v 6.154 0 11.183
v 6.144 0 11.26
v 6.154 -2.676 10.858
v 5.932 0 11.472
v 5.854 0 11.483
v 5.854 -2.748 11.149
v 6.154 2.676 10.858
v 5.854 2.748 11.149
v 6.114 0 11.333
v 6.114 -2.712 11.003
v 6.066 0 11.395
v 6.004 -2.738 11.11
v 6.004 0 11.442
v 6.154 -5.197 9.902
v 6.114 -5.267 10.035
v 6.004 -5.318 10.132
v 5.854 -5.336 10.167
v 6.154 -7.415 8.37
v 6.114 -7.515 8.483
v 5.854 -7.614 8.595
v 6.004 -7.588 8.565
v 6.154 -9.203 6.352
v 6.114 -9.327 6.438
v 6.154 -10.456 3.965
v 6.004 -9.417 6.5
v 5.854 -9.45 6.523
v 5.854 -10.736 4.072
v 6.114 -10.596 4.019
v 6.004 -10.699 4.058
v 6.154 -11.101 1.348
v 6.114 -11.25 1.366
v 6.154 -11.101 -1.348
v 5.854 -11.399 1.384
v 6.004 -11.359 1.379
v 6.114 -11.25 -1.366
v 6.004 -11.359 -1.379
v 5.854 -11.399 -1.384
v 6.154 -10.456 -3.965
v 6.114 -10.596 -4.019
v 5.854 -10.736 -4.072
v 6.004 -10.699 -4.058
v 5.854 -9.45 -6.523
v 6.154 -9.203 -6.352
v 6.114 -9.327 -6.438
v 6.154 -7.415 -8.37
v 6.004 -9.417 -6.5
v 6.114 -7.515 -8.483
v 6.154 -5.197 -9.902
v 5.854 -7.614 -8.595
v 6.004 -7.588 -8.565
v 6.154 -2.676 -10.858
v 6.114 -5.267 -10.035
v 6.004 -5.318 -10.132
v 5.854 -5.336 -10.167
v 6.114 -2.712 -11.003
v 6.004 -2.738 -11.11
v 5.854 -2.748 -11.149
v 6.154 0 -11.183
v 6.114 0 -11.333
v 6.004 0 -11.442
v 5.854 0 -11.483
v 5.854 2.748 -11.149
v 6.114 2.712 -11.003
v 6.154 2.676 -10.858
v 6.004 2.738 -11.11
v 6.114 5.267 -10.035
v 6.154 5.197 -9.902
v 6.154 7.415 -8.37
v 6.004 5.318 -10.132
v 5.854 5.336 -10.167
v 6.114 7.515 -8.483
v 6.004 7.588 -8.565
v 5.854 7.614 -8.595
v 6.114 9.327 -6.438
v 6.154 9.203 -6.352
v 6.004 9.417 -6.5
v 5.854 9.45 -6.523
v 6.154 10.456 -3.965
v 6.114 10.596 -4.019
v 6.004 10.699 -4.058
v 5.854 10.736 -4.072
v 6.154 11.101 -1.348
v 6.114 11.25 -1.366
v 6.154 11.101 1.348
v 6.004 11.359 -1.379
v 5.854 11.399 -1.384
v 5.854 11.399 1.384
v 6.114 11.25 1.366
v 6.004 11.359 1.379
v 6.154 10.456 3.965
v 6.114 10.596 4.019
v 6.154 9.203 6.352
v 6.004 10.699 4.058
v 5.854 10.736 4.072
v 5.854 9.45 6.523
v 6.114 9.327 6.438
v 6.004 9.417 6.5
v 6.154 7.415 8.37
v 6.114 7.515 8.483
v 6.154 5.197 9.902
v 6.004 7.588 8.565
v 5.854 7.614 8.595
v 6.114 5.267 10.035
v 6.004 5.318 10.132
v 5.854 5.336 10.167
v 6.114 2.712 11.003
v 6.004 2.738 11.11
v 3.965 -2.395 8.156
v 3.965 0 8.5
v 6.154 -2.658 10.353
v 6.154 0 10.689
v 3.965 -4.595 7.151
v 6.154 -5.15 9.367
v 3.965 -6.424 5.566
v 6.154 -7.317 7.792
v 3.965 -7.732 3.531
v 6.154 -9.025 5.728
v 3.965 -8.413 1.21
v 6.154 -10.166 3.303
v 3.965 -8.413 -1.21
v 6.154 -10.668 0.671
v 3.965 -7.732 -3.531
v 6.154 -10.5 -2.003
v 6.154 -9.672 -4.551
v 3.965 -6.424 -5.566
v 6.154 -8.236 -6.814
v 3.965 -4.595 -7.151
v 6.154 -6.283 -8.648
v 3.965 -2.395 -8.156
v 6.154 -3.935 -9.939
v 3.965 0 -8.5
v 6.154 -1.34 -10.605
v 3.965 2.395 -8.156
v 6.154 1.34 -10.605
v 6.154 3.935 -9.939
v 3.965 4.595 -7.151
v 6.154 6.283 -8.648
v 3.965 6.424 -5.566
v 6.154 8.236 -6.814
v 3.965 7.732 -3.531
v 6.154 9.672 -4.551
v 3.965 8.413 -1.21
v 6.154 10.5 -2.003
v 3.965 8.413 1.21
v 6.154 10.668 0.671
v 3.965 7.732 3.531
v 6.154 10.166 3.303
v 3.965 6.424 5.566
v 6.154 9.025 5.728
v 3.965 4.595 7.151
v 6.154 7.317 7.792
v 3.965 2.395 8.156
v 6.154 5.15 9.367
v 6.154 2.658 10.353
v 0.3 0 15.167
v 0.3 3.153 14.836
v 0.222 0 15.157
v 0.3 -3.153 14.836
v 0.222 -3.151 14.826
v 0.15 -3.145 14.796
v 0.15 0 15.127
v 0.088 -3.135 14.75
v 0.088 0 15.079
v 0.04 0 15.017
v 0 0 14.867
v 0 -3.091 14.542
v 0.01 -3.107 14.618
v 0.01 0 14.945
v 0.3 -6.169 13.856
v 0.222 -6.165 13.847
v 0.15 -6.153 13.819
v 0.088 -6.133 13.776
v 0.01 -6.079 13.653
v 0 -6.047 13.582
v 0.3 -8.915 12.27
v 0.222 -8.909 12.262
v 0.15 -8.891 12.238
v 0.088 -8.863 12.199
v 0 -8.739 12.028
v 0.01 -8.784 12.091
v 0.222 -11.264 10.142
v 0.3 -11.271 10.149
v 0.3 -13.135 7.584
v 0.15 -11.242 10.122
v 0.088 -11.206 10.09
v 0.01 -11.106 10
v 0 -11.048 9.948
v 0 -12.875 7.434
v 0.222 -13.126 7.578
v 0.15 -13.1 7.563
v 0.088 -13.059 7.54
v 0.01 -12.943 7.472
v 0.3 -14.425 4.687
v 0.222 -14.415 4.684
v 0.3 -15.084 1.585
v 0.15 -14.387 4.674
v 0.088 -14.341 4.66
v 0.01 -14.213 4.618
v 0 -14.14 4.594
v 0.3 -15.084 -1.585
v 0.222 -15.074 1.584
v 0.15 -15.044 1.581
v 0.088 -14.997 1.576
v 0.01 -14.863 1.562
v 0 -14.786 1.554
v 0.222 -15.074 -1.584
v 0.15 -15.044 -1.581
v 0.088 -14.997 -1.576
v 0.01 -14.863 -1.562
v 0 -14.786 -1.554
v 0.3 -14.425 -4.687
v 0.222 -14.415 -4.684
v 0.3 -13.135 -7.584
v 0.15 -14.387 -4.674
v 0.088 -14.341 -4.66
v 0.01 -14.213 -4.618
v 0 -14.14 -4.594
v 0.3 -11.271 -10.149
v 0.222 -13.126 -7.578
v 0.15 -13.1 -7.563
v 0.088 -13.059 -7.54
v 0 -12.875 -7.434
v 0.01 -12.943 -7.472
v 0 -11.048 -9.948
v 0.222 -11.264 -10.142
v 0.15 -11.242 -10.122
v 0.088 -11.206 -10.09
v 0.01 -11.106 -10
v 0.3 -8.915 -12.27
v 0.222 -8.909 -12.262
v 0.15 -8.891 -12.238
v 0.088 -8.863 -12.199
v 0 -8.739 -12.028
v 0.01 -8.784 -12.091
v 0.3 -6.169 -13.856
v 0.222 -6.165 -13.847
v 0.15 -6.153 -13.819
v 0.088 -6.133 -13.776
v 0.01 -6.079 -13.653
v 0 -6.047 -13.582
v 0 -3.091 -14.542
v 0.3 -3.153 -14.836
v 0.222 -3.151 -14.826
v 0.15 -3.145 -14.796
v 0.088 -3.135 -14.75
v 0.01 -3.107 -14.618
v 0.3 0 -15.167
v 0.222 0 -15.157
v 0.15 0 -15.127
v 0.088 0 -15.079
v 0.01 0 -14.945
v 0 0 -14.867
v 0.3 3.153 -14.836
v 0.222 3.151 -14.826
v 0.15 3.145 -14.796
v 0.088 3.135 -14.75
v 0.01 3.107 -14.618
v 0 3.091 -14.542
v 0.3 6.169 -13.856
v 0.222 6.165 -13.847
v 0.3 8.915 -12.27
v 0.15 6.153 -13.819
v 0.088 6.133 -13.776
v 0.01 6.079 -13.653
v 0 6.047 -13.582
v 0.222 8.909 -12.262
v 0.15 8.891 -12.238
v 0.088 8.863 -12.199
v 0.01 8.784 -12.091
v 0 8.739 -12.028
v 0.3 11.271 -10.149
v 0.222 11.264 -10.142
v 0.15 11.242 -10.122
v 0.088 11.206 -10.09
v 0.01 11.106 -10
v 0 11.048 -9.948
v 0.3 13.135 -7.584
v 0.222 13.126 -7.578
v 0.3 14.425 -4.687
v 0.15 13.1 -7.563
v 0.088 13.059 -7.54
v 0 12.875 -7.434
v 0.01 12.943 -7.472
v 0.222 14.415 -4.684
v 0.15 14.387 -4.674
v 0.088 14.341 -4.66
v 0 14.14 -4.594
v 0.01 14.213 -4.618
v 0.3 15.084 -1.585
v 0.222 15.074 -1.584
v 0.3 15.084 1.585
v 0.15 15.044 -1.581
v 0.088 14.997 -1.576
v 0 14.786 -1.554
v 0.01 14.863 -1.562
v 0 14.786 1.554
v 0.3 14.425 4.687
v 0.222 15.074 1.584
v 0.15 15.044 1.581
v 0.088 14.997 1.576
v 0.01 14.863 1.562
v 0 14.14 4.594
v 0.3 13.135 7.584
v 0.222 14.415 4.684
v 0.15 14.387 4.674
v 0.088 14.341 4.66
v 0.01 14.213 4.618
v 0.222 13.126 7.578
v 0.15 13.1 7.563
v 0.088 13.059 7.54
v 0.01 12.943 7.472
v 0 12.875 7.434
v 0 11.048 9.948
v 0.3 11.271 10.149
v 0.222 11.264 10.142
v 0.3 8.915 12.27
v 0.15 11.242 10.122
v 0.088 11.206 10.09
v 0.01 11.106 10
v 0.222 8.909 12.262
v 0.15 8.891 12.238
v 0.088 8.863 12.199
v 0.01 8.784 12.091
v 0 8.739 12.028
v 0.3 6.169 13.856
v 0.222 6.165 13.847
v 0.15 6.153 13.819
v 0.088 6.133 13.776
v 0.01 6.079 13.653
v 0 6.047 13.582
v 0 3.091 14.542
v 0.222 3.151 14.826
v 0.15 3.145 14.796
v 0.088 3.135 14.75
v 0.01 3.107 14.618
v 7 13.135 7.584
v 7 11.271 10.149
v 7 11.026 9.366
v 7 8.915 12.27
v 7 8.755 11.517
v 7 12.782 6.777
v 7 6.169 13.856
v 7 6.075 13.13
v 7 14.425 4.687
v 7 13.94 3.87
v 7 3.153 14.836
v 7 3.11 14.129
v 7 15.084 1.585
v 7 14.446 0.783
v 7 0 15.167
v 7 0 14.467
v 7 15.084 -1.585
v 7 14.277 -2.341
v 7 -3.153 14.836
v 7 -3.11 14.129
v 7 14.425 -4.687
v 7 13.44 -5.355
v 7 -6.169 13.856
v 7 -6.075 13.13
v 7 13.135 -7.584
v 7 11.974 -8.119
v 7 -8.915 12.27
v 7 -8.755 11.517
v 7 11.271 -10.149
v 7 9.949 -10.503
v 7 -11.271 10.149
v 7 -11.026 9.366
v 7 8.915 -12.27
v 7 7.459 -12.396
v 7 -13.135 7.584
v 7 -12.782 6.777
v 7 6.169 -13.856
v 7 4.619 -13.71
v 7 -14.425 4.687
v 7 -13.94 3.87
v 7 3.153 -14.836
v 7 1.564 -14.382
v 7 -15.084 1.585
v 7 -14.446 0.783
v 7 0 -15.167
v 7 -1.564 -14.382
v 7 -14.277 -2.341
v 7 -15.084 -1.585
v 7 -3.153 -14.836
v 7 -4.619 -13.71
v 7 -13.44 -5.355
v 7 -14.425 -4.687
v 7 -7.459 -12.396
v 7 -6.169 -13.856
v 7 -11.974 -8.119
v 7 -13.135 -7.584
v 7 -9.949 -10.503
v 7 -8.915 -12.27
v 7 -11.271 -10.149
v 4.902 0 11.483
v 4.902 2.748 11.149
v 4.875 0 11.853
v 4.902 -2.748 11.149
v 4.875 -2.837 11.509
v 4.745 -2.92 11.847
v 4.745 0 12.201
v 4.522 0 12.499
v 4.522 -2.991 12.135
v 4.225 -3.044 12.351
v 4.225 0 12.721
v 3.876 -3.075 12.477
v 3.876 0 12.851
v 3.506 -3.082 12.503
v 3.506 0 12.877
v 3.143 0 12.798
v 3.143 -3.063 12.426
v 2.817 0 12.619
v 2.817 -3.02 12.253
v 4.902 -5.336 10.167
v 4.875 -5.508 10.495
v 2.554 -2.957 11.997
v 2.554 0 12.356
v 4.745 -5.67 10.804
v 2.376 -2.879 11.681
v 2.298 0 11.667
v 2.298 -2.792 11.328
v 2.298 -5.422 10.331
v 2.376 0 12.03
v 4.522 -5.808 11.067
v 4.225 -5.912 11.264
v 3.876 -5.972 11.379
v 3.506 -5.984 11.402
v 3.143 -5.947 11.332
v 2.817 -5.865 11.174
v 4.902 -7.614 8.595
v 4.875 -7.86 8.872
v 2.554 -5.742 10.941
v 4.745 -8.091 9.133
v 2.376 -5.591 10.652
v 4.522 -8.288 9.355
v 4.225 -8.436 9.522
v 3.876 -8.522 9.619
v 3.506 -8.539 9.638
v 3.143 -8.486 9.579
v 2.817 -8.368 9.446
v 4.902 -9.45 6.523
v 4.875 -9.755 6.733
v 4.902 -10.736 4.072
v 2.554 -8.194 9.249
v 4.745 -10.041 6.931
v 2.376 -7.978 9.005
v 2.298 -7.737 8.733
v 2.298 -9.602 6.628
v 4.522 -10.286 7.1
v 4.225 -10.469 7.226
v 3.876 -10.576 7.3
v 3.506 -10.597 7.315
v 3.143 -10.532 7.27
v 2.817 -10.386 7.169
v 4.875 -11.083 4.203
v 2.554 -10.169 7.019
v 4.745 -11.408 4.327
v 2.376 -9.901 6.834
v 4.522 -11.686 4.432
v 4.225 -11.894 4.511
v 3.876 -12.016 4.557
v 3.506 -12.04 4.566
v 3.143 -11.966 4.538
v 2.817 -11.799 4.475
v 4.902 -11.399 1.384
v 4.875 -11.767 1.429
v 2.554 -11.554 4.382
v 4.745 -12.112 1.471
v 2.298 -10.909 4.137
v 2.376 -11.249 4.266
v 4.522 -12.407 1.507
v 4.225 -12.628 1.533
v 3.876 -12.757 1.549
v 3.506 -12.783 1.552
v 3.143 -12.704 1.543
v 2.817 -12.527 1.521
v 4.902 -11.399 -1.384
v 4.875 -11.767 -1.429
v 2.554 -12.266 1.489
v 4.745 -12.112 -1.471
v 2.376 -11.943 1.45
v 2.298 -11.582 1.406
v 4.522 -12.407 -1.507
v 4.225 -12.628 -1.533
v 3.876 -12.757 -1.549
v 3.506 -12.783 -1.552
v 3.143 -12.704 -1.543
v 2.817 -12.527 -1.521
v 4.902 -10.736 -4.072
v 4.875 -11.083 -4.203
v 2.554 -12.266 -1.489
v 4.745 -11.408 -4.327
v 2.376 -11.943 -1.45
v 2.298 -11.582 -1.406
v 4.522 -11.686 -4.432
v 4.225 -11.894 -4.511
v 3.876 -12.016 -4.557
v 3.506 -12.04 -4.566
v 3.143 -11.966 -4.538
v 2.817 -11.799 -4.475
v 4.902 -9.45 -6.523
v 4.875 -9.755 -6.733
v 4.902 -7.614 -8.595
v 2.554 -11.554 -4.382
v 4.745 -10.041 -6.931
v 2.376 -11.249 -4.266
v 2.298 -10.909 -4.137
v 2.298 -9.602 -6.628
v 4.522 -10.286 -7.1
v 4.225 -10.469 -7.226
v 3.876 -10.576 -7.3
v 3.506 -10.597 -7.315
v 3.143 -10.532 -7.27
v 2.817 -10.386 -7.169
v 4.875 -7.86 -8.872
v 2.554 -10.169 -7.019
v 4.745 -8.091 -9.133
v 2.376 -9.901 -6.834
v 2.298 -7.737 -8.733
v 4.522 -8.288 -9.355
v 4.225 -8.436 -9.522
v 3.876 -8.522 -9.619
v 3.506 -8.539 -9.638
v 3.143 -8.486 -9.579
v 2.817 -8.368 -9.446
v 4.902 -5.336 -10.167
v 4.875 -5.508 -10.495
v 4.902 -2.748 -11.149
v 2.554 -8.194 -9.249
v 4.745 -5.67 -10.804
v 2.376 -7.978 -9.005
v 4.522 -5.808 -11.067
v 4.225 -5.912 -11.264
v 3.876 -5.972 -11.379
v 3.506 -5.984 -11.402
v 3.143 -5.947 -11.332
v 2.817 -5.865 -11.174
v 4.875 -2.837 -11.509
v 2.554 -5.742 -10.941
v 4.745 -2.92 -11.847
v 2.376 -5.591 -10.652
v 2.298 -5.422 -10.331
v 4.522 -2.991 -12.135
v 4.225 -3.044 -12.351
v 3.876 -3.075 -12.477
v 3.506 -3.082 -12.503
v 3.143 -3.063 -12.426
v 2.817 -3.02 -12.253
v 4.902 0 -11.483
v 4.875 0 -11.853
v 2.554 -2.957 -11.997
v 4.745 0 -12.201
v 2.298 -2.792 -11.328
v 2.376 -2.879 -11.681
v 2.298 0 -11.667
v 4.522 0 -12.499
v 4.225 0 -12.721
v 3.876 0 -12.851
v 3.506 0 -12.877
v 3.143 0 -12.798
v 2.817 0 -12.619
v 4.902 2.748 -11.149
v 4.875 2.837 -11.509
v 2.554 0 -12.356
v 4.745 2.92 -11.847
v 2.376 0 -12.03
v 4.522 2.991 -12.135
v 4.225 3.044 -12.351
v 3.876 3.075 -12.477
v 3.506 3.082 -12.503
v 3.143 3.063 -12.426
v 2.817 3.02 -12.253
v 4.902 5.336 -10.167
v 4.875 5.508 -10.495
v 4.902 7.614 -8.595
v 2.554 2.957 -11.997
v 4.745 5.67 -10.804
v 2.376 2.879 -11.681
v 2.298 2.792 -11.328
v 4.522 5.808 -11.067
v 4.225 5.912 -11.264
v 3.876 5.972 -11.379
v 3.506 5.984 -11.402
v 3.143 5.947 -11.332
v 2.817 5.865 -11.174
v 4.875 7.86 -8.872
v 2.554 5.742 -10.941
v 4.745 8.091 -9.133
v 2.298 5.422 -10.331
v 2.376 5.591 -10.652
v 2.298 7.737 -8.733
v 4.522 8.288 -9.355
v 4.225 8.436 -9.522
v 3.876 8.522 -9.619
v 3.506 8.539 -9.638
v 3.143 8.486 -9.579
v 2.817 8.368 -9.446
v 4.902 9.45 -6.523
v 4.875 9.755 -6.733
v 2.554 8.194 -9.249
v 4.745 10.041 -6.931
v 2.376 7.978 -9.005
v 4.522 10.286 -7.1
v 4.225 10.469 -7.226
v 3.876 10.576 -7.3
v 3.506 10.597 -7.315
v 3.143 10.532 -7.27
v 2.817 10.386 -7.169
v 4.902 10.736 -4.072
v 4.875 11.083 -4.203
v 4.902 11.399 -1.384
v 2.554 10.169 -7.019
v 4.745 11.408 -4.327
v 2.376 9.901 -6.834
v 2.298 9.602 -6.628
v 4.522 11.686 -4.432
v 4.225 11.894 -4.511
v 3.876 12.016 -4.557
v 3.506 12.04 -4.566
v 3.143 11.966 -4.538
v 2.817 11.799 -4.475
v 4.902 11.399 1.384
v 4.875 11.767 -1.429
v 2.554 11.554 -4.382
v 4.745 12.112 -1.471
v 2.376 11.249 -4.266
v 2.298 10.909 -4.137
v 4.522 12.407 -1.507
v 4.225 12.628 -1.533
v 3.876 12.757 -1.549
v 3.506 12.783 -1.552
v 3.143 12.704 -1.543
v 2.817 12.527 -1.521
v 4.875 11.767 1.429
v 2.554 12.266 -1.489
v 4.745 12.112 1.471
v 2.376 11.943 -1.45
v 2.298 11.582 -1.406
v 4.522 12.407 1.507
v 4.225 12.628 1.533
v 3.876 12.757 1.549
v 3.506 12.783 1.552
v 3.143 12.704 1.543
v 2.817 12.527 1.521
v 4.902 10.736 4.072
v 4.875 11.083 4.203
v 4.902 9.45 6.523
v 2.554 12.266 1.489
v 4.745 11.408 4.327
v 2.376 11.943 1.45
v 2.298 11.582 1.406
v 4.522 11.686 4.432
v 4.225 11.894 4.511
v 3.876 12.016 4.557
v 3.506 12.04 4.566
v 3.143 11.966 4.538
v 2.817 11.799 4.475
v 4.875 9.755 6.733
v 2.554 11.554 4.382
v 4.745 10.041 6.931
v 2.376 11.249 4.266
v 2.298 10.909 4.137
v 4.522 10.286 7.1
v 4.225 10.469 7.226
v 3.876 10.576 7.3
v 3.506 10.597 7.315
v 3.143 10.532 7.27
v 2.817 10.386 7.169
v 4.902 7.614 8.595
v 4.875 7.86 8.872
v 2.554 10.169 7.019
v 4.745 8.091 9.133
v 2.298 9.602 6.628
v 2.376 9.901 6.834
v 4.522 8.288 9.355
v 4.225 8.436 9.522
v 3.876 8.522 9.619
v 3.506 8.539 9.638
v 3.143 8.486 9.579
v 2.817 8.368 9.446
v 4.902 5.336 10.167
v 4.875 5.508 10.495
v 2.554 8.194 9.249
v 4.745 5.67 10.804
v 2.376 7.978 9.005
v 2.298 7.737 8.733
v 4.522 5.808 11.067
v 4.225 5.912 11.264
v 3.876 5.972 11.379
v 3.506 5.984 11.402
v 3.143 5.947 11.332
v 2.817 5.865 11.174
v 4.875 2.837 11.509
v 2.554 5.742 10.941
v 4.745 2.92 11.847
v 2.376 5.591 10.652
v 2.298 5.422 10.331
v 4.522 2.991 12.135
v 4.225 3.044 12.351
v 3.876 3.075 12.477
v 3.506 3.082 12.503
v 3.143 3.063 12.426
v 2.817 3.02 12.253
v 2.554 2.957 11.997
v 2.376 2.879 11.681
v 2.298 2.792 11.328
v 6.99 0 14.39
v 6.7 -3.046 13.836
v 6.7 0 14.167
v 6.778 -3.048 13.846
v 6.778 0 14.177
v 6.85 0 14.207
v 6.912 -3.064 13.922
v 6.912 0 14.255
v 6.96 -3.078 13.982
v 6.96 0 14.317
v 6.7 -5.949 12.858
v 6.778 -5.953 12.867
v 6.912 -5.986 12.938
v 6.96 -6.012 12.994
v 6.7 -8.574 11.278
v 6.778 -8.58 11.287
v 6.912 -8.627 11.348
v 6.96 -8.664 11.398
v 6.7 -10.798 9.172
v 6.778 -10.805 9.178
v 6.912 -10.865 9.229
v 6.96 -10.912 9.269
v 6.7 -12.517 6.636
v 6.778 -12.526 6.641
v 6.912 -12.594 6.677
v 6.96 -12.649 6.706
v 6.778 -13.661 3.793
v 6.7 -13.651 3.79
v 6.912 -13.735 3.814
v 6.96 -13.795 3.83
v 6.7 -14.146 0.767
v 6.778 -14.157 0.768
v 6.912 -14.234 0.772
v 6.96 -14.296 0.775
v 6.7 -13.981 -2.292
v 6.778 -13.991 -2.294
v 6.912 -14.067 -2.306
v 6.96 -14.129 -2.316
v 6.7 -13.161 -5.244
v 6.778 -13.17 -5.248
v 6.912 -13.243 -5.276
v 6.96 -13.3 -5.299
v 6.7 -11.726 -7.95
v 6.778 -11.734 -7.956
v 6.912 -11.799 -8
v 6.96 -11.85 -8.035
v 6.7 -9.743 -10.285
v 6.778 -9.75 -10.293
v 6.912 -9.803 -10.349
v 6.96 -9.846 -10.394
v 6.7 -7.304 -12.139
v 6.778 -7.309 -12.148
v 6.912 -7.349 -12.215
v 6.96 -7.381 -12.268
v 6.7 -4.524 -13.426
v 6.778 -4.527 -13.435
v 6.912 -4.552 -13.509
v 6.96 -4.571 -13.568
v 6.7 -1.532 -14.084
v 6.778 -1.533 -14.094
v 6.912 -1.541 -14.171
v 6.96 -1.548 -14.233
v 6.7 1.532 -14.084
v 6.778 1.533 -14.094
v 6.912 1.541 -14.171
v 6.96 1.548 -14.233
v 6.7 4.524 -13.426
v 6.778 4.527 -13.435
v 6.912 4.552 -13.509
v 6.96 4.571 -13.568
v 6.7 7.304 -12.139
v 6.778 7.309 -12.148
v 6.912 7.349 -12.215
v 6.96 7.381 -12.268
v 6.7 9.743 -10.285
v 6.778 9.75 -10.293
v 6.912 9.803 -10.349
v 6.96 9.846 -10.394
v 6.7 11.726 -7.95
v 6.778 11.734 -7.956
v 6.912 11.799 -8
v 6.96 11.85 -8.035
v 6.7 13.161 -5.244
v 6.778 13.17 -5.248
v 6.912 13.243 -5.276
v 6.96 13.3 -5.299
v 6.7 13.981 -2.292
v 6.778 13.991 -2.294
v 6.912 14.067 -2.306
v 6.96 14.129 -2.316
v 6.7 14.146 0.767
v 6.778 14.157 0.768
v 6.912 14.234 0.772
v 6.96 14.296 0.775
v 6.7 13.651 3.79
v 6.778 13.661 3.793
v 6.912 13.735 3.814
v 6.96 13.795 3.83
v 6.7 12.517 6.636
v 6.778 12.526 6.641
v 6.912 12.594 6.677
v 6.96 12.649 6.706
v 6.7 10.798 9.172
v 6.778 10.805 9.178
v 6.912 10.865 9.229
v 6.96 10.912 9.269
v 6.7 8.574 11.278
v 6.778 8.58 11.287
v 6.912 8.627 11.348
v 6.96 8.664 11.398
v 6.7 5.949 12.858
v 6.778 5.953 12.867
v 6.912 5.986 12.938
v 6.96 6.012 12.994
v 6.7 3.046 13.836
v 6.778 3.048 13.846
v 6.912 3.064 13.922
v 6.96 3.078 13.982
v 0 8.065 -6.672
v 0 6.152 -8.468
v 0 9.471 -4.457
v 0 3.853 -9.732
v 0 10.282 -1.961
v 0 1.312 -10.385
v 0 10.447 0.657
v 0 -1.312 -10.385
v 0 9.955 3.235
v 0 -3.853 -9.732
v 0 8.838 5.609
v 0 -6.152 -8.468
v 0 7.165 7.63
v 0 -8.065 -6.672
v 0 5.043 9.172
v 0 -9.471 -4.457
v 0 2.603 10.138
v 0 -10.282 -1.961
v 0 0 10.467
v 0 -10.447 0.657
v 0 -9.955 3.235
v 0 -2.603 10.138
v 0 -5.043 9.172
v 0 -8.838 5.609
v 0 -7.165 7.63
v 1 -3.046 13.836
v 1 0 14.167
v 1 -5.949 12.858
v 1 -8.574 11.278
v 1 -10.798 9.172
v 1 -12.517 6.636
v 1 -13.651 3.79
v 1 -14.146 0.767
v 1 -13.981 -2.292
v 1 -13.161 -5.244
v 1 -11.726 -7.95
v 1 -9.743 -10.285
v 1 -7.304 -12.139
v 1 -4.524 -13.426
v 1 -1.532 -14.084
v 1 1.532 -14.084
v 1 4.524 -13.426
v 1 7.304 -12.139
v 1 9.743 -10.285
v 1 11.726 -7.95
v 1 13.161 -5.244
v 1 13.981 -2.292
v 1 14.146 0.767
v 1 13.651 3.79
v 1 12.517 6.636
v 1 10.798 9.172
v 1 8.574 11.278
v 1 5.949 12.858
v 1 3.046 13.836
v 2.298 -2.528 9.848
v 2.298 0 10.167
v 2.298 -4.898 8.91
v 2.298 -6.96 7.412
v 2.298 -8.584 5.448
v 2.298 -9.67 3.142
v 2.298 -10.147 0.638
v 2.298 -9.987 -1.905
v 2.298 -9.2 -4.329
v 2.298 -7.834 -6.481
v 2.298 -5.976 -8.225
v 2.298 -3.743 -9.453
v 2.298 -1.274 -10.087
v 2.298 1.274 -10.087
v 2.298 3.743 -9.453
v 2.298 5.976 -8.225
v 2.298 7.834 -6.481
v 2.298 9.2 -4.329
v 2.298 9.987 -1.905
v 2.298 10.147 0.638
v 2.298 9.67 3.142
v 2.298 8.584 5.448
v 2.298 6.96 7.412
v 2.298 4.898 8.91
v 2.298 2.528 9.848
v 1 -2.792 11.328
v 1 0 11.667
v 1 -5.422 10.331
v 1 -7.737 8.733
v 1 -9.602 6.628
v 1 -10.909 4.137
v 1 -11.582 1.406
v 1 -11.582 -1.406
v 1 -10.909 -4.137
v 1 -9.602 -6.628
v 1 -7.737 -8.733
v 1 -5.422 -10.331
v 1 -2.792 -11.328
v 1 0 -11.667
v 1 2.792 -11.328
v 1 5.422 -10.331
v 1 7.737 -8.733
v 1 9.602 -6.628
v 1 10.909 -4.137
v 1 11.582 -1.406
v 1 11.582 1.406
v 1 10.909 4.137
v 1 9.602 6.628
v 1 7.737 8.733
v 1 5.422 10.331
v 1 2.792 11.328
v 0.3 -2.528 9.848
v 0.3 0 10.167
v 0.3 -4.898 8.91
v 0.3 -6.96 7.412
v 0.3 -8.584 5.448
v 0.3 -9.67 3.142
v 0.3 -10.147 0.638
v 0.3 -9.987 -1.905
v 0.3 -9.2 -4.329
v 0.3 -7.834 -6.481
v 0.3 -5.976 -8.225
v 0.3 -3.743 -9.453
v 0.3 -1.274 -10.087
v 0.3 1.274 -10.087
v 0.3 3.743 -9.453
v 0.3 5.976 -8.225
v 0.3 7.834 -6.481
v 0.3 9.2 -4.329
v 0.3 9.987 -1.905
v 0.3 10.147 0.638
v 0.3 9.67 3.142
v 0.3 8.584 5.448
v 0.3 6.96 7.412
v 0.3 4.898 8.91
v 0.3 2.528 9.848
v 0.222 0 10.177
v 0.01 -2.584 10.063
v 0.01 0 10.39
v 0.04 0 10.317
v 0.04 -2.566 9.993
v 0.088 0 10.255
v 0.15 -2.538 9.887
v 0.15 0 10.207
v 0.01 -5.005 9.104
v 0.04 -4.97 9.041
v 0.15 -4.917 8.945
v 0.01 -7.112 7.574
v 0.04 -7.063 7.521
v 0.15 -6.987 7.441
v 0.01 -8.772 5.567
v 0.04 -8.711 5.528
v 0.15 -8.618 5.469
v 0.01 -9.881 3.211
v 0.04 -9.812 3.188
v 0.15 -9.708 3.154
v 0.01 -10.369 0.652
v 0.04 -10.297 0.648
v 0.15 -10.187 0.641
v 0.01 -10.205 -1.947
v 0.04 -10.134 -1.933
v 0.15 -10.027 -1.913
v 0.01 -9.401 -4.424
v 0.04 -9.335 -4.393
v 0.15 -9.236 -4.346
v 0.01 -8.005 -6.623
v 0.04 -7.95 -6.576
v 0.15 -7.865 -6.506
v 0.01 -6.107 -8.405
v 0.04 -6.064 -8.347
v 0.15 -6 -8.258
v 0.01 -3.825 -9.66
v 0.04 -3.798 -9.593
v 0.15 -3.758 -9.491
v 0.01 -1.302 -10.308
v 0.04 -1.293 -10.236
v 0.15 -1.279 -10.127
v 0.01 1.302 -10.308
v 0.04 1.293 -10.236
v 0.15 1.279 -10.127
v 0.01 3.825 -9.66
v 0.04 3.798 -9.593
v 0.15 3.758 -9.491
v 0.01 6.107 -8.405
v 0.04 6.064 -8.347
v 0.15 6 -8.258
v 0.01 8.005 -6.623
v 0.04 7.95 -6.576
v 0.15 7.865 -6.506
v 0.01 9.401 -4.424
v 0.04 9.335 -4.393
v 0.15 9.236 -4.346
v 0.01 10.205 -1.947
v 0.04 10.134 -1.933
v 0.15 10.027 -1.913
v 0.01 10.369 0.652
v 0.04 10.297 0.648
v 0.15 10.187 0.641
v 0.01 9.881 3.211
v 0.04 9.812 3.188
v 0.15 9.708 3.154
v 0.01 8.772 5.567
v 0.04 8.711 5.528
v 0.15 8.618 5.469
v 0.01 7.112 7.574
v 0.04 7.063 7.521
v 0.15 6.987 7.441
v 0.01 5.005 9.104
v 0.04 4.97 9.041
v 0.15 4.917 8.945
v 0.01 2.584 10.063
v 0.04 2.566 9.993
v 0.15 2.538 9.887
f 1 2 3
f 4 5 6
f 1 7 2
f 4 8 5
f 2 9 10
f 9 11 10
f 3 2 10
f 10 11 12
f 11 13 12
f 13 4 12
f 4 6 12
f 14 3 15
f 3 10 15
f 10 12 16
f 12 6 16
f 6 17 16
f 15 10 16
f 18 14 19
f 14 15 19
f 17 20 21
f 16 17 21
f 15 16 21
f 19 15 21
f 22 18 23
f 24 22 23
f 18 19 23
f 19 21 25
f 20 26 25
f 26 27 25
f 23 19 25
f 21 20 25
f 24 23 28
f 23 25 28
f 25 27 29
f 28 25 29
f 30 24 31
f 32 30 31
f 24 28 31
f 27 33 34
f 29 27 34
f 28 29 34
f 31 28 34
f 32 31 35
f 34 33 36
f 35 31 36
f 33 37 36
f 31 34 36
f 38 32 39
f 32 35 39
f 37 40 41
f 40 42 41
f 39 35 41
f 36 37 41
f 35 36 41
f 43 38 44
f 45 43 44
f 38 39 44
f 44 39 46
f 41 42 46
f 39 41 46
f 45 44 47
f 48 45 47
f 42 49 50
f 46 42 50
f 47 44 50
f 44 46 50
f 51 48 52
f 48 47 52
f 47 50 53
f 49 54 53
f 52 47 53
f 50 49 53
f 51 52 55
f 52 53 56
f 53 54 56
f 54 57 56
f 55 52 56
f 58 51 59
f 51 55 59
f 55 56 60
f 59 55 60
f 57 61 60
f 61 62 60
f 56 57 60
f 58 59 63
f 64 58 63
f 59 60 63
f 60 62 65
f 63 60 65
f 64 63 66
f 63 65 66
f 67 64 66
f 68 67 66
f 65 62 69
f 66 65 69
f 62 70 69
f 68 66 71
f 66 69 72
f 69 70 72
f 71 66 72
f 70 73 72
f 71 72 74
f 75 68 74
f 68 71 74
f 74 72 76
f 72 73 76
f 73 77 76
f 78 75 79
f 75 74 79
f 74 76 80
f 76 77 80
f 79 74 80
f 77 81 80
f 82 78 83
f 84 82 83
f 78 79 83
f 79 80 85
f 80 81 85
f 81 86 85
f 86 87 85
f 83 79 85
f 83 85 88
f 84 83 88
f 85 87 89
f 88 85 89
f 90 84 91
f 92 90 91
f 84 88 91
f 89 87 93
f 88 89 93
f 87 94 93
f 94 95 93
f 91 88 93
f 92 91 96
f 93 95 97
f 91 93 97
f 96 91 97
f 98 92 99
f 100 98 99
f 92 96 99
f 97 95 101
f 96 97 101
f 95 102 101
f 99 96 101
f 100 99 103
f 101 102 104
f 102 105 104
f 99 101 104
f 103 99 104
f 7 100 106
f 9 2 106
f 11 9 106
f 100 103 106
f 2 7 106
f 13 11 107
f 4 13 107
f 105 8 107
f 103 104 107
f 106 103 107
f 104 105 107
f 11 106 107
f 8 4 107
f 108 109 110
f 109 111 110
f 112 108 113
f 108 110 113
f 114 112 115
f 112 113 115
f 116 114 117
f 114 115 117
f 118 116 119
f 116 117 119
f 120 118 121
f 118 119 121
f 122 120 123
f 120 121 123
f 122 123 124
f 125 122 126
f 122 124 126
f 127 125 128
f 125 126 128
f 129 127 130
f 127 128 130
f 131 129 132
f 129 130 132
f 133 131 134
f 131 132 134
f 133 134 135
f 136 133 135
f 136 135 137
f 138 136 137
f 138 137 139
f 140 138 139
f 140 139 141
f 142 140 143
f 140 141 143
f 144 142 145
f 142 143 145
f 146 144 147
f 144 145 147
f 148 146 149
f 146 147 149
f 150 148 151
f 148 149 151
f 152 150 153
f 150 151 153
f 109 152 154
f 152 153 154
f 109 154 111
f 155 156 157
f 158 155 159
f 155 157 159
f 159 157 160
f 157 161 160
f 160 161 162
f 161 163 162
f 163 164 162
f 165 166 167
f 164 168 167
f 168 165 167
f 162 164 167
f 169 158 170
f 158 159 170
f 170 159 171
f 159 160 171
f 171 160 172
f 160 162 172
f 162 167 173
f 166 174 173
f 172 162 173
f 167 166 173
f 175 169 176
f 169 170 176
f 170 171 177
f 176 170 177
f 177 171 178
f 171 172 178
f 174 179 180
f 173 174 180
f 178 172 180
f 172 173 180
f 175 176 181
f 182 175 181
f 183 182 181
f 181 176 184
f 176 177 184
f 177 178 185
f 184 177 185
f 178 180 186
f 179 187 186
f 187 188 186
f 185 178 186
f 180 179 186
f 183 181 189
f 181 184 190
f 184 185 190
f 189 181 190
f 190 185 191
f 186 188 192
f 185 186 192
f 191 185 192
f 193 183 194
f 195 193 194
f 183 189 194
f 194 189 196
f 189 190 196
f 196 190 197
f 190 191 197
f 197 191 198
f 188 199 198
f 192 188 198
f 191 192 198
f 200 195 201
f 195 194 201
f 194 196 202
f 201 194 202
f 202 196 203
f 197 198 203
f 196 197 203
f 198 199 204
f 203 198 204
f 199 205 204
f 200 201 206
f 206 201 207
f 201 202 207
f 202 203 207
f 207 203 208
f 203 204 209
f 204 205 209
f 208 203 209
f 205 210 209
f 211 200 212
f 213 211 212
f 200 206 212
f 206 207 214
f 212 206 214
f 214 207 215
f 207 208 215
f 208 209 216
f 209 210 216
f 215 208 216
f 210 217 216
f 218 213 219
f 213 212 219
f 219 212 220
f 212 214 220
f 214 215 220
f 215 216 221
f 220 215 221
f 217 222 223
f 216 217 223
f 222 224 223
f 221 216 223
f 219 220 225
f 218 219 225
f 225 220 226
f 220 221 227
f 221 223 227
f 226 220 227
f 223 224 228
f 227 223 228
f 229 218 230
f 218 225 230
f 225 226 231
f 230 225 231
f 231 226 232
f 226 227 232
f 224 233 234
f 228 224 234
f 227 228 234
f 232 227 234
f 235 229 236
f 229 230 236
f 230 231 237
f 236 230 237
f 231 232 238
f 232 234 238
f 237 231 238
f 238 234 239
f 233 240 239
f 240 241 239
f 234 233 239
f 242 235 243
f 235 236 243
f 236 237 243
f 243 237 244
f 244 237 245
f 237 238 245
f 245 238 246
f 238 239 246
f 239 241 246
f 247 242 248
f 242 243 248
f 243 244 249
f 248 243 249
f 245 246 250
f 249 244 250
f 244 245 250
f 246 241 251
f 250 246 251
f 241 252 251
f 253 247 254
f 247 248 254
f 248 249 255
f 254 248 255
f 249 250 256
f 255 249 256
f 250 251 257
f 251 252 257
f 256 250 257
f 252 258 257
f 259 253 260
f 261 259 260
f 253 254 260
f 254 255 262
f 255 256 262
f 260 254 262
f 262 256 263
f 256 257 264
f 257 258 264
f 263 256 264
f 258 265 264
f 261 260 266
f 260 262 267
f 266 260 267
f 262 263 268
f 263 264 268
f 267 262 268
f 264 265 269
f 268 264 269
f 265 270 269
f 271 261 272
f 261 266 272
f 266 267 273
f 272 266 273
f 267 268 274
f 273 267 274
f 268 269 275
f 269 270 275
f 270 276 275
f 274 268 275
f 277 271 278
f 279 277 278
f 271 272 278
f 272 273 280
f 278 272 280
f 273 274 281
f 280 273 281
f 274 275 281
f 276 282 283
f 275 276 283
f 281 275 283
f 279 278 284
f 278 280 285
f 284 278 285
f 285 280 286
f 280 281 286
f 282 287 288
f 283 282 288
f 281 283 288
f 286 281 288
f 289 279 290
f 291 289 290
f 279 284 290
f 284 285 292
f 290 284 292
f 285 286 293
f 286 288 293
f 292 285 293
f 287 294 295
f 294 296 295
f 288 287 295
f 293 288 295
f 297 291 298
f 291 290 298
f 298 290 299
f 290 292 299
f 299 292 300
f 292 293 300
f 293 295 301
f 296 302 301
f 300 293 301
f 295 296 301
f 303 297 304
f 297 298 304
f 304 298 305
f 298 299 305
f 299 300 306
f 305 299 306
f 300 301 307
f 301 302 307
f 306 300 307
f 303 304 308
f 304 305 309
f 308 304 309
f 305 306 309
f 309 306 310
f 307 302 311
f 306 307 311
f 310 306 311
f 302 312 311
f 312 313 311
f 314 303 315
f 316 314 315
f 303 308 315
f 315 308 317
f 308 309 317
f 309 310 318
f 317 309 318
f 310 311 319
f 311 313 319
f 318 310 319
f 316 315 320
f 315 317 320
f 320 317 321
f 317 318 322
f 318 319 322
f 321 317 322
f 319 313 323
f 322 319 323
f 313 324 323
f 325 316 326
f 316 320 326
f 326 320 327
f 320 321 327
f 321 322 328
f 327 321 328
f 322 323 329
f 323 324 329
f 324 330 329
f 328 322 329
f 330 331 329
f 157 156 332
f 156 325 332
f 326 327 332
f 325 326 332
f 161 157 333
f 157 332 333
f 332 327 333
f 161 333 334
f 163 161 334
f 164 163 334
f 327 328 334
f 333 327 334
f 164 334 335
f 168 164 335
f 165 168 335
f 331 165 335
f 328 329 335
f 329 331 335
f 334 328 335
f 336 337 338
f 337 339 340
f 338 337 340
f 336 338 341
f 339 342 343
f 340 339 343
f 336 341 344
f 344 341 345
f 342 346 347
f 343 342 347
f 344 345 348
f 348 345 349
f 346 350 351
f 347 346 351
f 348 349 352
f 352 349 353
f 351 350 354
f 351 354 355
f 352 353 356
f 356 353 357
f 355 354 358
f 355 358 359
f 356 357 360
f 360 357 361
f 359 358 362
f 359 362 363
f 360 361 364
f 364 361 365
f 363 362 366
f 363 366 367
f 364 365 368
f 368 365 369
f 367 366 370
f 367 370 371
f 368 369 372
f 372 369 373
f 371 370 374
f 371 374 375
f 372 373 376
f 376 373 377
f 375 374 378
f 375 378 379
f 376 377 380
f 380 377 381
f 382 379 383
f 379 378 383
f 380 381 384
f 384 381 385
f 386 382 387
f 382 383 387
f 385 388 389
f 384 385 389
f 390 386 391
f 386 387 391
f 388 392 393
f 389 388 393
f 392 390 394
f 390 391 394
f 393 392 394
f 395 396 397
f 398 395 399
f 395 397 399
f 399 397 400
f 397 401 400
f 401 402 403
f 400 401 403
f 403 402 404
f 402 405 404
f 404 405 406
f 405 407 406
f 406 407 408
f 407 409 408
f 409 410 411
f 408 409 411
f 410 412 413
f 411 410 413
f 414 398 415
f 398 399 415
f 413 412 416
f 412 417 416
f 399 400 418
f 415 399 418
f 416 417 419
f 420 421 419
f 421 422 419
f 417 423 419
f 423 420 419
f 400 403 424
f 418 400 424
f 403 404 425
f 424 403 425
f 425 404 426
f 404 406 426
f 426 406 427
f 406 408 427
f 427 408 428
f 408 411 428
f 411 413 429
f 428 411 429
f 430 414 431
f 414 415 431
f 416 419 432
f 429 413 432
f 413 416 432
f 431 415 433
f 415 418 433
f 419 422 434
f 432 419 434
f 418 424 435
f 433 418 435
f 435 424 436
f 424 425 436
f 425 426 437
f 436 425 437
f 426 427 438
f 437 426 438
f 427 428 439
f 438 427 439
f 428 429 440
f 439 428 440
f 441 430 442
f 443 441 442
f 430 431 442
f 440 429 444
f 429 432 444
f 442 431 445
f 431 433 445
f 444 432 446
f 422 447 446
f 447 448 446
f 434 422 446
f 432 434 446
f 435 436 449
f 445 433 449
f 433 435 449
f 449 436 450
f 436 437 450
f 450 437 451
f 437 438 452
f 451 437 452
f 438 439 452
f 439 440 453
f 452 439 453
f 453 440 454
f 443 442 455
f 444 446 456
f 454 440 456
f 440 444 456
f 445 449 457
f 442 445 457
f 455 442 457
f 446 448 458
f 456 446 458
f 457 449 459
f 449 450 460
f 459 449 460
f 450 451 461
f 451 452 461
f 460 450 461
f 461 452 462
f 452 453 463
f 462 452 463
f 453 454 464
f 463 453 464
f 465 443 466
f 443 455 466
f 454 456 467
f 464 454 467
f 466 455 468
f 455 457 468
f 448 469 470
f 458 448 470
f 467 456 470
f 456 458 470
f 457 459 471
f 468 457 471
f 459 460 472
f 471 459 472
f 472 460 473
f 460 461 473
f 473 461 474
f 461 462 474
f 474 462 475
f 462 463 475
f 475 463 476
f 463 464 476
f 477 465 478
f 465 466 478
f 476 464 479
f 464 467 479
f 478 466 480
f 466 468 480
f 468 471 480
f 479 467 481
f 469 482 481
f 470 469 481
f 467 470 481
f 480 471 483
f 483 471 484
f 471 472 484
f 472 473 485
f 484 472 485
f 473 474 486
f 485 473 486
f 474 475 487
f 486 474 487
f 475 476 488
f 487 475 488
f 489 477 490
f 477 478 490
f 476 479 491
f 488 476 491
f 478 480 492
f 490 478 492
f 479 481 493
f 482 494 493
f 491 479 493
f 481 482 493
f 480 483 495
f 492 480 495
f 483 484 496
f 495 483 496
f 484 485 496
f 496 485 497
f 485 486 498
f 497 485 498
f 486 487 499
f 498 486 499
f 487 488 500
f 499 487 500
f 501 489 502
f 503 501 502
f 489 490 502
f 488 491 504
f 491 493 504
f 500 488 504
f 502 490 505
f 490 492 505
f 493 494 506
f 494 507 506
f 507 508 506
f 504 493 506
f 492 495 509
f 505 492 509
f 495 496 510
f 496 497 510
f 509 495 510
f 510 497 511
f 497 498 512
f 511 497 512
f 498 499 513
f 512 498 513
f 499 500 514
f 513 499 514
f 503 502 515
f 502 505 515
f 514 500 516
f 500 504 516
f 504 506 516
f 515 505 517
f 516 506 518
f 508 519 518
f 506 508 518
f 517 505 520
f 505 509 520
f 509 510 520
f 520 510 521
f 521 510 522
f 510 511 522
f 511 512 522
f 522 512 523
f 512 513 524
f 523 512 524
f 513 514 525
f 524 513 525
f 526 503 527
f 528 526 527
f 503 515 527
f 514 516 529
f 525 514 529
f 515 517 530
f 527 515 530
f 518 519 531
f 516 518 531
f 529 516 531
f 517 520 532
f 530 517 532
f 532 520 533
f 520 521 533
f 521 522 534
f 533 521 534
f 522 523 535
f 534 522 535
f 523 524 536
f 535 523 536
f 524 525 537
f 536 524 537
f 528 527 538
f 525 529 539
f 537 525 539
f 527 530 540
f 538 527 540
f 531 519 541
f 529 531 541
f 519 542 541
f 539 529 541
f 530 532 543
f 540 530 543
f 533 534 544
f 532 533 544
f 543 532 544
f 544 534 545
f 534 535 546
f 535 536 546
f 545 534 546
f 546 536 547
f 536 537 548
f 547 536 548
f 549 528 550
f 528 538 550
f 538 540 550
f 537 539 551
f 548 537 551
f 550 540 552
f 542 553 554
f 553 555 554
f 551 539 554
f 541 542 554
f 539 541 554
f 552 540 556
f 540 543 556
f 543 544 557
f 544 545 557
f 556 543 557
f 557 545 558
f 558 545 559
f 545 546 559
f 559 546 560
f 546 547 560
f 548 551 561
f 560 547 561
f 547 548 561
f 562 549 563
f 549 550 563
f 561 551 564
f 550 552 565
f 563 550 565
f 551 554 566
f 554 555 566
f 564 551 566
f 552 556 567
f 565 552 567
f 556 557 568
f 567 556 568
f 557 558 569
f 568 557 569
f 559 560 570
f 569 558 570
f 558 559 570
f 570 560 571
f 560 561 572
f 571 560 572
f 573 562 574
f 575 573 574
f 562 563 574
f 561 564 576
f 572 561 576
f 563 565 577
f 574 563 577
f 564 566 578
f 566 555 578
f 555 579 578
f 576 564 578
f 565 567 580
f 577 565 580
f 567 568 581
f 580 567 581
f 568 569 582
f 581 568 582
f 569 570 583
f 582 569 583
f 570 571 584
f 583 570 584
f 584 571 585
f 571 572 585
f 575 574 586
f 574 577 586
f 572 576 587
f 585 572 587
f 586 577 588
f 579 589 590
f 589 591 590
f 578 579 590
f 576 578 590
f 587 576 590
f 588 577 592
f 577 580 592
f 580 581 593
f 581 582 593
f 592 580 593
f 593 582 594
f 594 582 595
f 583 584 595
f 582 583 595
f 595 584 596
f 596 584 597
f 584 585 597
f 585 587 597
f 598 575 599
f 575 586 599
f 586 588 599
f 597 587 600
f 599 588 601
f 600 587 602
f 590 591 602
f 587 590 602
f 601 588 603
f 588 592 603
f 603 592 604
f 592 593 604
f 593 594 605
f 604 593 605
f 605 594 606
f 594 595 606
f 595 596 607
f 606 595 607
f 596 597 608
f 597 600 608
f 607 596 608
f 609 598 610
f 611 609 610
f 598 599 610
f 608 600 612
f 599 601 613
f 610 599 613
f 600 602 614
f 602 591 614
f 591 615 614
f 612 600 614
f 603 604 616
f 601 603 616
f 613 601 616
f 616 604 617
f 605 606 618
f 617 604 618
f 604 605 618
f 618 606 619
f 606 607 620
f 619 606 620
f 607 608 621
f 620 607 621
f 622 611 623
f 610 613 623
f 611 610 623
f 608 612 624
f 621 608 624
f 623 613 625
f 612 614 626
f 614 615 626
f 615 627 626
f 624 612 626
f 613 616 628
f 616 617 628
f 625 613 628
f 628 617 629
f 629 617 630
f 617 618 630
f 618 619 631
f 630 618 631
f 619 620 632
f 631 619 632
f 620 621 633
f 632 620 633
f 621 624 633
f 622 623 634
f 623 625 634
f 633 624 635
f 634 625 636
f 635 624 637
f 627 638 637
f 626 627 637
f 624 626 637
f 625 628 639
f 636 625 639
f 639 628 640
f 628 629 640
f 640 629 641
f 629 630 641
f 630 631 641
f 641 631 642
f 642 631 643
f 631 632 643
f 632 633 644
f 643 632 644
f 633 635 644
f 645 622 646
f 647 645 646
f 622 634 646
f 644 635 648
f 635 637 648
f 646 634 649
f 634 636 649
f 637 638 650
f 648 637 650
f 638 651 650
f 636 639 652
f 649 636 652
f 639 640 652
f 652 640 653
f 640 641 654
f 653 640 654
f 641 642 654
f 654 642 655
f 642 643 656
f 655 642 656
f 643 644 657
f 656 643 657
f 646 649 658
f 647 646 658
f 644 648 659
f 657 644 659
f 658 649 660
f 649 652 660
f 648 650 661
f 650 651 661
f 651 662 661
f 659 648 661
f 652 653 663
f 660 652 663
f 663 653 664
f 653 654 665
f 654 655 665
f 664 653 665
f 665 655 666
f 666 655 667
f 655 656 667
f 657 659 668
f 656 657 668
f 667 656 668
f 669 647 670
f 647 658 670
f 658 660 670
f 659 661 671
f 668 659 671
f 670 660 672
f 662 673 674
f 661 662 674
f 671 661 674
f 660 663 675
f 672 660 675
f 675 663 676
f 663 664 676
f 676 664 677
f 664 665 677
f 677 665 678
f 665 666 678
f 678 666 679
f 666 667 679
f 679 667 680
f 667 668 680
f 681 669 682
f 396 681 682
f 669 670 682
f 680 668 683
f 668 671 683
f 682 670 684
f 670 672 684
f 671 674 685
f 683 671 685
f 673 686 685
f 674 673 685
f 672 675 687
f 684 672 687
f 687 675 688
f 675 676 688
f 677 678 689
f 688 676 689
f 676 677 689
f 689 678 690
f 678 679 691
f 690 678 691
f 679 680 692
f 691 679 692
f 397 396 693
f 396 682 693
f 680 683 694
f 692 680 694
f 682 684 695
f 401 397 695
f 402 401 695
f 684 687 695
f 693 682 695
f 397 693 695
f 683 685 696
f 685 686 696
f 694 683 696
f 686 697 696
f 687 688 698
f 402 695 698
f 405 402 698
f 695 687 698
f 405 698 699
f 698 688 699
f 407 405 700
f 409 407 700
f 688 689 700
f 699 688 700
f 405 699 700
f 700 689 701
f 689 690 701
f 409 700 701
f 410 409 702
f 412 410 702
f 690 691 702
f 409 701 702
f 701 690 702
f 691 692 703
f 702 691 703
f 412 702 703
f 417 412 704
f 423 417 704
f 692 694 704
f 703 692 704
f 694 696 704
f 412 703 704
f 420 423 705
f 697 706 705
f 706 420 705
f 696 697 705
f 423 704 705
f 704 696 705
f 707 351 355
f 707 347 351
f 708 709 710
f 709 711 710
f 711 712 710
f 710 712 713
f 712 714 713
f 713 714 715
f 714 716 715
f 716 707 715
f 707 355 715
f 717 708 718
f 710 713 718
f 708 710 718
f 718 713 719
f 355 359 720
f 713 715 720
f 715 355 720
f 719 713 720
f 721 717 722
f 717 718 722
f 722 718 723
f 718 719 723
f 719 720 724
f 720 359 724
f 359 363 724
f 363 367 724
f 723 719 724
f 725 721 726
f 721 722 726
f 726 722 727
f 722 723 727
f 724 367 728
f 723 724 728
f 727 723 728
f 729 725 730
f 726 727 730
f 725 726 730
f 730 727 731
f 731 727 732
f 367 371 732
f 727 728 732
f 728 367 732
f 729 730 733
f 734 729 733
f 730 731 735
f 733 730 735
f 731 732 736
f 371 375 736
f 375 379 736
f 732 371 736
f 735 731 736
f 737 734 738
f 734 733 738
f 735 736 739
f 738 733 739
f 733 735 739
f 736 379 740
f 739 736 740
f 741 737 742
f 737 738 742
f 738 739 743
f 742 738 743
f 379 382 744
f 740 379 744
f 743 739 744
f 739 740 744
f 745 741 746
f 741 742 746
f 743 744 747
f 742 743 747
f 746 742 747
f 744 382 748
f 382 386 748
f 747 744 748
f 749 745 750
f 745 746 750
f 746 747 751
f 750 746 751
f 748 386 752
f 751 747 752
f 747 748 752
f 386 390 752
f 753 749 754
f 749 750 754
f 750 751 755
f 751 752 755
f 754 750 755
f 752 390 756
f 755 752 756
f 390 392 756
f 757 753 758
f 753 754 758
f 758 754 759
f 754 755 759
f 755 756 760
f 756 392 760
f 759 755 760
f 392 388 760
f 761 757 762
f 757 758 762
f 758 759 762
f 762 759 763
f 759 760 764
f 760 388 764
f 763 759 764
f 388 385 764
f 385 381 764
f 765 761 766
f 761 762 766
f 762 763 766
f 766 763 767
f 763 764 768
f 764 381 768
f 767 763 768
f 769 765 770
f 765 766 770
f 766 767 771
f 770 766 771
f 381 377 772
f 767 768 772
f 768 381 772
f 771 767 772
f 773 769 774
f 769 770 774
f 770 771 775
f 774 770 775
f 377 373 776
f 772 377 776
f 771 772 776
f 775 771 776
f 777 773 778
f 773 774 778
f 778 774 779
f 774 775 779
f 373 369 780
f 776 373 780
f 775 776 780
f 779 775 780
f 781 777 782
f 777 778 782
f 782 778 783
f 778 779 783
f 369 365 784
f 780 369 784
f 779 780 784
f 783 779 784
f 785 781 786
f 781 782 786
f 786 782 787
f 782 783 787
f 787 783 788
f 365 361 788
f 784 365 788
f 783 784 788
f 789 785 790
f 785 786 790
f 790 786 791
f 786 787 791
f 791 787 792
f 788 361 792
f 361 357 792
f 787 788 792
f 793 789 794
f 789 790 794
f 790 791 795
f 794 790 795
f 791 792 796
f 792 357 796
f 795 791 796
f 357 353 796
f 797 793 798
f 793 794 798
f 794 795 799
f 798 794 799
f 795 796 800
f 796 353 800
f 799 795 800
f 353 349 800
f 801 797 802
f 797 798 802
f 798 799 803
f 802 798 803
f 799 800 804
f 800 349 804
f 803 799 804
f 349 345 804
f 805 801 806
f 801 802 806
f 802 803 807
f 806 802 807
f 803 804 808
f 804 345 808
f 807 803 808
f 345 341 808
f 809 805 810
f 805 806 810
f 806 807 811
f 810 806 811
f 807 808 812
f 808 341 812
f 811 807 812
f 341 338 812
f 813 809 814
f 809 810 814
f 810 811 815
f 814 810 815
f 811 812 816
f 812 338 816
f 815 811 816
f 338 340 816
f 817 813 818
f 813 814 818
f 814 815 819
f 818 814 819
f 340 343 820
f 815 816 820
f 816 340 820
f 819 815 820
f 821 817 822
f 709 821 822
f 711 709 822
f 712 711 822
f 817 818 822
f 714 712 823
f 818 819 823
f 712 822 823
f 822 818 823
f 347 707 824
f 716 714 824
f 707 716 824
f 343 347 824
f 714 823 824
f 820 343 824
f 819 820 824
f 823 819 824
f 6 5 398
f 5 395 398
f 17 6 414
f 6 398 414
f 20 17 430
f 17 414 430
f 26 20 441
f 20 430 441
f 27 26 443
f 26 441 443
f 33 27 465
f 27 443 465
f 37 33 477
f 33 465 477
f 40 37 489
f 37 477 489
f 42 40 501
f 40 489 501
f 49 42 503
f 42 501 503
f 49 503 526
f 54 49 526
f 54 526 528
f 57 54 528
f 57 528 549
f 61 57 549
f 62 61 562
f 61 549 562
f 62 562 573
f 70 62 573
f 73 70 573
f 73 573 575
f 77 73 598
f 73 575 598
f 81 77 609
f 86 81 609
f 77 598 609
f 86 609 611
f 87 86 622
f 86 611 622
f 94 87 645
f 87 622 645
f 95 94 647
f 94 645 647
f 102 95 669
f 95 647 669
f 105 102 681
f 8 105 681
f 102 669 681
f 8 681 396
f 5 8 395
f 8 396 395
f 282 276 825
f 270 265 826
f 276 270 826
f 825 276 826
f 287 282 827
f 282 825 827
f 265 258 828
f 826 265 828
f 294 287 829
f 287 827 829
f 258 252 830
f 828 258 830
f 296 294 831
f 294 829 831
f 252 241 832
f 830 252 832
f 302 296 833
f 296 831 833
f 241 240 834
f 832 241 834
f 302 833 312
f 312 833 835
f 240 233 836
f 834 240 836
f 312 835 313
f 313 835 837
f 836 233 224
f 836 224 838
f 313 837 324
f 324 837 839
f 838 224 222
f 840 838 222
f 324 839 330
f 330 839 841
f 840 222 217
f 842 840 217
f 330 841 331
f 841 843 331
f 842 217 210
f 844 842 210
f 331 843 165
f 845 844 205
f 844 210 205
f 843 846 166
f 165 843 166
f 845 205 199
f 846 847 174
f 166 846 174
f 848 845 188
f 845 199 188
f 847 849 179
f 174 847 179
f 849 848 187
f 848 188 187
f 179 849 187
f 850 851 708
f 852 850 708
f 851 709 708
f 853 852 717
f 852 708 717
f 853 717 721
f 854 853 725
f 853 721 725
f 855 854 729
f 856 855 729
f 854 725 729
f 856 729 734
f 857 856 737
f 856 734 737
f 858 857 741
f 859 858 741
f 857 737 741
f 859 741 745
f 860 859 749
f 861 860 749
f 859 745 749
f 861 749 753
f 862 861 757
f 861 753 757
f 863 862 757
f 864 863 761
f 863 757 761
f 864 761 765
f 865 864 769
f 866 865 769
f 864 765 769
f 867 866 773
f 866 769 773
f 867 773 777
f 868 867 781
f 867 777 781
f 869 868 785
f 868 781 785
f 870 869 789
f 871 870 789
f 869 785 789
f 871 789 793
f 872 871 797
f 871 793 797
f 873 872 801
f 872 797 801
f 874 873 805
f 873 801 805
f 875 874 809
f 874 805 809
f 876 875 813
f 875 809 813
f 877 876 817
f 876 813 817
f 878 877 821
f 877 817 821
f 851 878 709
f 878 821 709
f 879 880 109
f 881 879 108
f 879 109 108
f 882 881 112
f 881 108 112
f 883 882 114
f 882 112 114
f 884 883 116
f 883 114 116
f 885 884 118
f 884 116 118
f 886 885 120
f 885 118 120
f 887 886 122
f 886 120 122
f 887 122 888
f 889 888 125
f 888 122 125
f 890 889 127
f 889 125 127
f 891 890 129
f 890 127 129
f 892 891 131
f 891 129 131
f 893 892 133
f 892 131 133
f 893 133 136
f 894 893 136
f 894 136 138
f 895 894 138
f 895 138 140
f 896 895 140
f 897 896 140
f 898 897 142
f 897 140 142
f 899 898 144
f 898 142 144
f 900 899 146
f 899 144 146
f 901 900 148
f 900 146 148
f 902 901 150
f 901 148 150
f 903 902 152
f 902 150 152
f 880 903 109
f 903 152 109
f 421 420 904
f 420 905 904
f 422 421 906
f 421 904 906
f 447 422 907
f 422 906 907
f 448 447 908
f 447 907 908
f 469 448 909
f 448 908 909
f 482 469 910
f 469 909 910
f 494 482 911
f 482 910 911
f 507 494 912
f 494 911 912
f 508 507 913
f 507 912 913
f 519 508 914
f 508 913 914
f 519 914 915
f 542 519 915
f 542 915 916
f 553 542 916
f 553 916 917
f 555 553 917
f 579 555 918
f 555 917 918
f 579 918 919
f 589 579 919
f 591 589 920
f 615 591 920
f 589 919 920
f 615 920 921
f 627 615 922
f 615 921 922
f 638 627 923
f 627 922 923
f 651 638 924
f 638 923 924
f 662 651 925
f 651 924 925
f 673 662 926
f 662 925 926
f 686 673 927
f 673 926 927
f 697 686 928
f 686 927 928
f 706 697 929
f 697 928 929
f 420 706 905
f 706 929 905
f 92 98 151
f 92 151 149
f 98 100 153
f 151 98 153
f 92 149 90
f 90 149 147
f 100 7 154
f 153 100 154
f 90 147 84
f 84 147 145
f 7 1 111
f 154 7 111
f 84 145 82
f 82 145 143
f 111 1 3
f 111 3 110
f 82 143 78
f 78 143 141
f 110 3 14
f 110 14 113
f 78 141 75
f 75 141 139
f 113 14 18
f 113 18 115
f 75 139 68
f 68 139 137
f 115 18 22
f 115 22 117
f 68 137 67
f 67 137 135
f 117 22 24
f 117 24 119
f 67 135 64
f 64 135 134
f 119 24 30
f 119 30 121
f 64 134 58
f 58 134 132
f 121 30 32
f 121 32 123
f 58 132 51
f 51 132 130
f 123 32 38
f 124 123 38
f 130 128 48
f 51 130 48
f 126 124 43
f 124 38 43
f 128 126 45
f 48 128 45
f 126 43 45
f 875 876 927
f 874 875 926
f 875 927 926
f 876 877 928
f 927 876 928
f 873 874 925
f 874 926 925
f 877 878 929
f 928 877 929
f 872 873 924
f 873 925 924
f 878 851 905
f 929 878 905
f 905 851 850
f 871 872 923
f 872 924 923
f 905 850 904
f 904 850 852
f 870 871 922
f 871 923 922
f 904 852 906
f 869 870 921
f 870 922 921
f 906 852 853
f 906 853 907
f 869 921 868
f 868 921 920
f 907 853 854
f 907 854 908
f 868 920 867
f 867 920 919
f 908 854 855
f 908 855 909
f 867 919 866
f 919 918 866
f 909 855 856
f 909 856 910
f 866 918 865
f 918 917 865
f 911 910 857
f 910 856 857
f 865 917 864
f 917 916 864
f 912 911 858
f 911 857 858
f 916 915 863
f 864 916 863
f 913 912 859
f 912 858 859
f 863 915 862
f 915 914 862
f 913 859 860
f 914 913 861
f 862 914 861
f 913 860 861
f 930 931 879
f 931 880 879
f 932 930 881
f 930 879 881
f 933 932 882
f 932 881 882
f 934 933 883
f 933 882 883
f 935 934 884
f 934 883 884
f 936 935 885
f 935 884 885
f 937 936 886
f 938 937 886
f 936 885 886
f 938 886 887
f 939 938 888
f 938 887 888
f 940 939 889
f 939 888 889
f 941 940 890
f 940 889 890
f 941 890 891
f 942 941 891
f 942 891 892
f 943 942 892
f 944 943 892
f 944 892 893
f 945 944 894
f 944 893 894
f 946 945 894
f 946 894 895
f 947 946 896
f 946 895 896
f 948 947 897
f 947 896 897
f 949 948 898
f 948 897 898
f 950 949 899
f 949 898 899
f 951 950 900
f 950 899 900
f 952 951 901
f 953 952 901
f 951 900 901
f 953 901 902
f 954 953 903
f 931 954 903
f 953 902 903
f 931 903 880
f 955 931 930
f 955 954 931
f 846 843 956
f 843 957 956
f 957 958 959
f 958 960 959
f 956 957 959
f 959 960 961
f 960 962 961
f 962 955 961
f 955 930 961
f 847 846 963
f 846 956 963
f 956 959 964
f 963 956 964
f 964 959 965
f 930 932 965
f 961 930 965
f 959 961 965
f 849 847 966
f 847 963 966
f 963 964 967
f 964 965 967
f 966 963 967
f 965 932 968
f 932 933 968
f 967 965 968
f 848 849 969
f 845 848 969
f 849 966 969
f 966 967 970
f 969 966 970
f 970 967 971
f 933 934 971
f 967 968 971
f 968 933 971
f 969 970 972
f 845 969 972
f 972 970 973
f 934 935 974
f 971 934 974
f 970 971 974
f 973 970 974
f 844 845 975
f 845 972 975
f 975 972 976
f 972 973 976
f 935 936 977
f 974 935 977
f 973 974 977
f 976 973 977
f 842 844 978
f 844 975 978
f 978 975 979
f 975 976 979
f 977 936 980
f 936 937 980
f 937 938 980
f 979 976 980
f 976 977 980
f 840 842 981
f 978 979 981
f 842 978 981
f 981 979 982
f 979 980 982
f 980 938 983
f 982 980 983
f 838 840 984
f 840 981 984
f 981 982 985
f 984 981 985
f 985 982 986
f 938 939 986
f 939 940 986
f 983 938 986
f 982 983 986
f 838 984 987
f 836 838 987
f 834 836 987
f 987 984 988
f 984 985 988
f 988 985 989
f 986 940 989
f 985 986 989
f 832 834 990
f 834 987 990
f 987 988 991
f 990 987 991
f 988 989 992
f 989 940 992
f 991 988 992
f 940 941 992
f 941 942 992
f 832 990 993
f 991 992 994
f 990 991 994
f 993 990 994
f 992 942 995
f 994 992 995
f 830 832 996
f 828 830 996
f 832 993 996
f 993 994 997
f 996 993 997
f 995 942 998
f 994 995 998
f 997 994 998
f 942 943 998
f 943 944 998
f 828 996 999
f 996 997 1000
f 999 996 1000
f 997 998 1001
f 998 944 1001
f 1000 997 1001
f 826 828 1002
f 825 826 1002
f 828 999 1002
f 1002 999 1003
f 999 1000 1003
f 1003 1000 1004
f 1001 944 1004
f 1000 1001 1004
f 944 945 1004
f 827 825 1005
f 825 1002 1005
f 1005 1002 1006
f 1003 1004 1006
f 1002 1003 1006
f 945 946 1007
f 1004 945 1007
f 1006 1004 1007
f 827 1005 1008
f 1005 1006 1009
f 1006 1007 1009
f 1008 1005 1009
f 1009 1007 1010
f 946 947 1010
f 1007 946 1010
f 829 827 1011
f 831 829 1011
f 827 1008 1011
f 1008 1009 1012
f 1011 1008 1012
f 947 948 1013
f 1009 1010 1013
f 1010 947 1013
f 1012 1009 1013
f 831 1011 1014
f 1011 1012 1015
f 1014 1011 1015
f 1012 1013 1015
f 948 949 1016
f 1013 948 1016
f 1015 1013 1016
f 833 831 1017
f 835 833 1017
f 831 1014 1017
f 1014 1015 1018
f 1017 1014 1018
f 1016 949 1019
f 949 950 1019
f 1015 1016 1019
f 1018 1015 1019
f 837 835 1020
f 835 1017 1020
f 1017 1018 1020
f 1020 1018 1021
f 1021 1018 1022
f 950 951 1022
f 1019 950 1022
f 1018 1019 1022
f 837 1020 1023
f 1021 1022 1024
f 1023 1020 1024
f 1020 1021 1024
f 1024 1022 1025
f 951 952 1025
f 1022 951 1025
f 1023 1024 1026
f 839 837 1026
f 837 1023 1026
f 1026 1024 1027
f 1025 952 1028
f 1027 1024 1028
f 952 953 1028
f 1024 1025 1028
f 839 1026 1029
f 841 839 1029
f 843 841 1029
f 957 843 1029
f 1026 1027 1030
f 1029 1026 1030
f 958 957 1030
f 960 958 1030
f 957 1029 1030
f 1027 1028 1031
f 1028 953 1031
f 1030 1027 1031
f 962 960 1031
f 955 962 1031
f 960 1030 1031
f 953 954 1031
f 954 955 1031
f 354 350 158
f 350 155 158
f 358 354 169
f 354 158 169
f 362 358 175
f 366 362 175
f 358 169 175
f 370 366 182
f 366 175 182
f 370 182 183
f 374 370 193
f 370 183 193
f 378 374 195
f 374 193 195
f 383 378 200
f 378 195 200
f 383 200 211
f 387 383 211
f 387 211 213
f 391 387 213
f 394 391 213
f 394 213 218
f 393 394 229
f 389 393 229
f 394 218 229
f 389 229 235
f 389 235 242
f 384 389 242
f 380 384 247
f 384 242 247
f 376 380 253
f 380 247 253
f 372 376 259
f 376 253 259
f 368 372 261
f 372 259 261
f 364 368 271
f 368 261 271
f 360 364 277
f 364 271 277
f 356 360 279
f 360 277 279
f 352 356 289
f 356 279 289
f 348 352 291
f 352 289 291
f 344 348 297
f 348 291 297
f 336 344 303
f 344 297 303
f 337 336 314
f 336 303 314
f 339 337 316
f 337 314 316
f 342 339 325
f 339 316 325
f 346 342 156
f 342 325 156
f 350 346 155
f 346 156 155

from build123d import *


with BuildPart() as part:
    # Çizim1 → Döndür1 (revolve)
    with BuildSketch(Plane.XY, mode=Mode.PRIVATE) as d_nd_r1_sk:
        with BuildLine():
            Line((7, 15.167162356), (0.3, 15.167162356))
            ThreePointArc((0.3, 15.167162356), (0.087867966, 15.079294391), (0, 14.867162356))
            Line((0, 14.867162356), (0, 10.467162356))
            ThreePointArc((0, 10.467162356), (0.087867966, 10.255030322), (0.3, 10.167162356))
            Line((0.3, 10.167162356), (2.297581493, 10.167162356))
            Line((2.297581493, 10.167162356), (3.96474385, 8.5))
            Line((3.96474385, 8.5), (6.153966129, 10.689222279))
            Line((6.153966129, 10.689222279), (6.153966129, 11.182619933))
            ThreePointArc((6.153966129, 11.182619933), (6.066098163, 11.394751968), (5.853966129, 11.482619933))
            Line((5.853966129, 11.482619933), (4.901824756, 11.482619933))
            ThreePointArc((4.901824756, 11.482619933), (3.691974336, 12.877012776), (2.297581493, 11.667162356))
            Line((2.297581493, 11.667162356), (1, 11.667162356))
            Line((1, 11.667162356), (1, 14.167162356))
            Line((1, 14.167162356), (6.7, 14.167162356))
            ThreePointArc((6.7, 14.167162356), (6.912132034, 14.255030322), (7, 14.467162356))
            Line((7, 14.467162356), (7, 15.167162356))
        make_face()
    revolve(d_nd_r1_sk.sketch.rotate(Axis((0, 0, 0), (1, 0, 0)), 90), axis=Axis((0, 0, 0), (1, 0, 0)))


solid = part.part
